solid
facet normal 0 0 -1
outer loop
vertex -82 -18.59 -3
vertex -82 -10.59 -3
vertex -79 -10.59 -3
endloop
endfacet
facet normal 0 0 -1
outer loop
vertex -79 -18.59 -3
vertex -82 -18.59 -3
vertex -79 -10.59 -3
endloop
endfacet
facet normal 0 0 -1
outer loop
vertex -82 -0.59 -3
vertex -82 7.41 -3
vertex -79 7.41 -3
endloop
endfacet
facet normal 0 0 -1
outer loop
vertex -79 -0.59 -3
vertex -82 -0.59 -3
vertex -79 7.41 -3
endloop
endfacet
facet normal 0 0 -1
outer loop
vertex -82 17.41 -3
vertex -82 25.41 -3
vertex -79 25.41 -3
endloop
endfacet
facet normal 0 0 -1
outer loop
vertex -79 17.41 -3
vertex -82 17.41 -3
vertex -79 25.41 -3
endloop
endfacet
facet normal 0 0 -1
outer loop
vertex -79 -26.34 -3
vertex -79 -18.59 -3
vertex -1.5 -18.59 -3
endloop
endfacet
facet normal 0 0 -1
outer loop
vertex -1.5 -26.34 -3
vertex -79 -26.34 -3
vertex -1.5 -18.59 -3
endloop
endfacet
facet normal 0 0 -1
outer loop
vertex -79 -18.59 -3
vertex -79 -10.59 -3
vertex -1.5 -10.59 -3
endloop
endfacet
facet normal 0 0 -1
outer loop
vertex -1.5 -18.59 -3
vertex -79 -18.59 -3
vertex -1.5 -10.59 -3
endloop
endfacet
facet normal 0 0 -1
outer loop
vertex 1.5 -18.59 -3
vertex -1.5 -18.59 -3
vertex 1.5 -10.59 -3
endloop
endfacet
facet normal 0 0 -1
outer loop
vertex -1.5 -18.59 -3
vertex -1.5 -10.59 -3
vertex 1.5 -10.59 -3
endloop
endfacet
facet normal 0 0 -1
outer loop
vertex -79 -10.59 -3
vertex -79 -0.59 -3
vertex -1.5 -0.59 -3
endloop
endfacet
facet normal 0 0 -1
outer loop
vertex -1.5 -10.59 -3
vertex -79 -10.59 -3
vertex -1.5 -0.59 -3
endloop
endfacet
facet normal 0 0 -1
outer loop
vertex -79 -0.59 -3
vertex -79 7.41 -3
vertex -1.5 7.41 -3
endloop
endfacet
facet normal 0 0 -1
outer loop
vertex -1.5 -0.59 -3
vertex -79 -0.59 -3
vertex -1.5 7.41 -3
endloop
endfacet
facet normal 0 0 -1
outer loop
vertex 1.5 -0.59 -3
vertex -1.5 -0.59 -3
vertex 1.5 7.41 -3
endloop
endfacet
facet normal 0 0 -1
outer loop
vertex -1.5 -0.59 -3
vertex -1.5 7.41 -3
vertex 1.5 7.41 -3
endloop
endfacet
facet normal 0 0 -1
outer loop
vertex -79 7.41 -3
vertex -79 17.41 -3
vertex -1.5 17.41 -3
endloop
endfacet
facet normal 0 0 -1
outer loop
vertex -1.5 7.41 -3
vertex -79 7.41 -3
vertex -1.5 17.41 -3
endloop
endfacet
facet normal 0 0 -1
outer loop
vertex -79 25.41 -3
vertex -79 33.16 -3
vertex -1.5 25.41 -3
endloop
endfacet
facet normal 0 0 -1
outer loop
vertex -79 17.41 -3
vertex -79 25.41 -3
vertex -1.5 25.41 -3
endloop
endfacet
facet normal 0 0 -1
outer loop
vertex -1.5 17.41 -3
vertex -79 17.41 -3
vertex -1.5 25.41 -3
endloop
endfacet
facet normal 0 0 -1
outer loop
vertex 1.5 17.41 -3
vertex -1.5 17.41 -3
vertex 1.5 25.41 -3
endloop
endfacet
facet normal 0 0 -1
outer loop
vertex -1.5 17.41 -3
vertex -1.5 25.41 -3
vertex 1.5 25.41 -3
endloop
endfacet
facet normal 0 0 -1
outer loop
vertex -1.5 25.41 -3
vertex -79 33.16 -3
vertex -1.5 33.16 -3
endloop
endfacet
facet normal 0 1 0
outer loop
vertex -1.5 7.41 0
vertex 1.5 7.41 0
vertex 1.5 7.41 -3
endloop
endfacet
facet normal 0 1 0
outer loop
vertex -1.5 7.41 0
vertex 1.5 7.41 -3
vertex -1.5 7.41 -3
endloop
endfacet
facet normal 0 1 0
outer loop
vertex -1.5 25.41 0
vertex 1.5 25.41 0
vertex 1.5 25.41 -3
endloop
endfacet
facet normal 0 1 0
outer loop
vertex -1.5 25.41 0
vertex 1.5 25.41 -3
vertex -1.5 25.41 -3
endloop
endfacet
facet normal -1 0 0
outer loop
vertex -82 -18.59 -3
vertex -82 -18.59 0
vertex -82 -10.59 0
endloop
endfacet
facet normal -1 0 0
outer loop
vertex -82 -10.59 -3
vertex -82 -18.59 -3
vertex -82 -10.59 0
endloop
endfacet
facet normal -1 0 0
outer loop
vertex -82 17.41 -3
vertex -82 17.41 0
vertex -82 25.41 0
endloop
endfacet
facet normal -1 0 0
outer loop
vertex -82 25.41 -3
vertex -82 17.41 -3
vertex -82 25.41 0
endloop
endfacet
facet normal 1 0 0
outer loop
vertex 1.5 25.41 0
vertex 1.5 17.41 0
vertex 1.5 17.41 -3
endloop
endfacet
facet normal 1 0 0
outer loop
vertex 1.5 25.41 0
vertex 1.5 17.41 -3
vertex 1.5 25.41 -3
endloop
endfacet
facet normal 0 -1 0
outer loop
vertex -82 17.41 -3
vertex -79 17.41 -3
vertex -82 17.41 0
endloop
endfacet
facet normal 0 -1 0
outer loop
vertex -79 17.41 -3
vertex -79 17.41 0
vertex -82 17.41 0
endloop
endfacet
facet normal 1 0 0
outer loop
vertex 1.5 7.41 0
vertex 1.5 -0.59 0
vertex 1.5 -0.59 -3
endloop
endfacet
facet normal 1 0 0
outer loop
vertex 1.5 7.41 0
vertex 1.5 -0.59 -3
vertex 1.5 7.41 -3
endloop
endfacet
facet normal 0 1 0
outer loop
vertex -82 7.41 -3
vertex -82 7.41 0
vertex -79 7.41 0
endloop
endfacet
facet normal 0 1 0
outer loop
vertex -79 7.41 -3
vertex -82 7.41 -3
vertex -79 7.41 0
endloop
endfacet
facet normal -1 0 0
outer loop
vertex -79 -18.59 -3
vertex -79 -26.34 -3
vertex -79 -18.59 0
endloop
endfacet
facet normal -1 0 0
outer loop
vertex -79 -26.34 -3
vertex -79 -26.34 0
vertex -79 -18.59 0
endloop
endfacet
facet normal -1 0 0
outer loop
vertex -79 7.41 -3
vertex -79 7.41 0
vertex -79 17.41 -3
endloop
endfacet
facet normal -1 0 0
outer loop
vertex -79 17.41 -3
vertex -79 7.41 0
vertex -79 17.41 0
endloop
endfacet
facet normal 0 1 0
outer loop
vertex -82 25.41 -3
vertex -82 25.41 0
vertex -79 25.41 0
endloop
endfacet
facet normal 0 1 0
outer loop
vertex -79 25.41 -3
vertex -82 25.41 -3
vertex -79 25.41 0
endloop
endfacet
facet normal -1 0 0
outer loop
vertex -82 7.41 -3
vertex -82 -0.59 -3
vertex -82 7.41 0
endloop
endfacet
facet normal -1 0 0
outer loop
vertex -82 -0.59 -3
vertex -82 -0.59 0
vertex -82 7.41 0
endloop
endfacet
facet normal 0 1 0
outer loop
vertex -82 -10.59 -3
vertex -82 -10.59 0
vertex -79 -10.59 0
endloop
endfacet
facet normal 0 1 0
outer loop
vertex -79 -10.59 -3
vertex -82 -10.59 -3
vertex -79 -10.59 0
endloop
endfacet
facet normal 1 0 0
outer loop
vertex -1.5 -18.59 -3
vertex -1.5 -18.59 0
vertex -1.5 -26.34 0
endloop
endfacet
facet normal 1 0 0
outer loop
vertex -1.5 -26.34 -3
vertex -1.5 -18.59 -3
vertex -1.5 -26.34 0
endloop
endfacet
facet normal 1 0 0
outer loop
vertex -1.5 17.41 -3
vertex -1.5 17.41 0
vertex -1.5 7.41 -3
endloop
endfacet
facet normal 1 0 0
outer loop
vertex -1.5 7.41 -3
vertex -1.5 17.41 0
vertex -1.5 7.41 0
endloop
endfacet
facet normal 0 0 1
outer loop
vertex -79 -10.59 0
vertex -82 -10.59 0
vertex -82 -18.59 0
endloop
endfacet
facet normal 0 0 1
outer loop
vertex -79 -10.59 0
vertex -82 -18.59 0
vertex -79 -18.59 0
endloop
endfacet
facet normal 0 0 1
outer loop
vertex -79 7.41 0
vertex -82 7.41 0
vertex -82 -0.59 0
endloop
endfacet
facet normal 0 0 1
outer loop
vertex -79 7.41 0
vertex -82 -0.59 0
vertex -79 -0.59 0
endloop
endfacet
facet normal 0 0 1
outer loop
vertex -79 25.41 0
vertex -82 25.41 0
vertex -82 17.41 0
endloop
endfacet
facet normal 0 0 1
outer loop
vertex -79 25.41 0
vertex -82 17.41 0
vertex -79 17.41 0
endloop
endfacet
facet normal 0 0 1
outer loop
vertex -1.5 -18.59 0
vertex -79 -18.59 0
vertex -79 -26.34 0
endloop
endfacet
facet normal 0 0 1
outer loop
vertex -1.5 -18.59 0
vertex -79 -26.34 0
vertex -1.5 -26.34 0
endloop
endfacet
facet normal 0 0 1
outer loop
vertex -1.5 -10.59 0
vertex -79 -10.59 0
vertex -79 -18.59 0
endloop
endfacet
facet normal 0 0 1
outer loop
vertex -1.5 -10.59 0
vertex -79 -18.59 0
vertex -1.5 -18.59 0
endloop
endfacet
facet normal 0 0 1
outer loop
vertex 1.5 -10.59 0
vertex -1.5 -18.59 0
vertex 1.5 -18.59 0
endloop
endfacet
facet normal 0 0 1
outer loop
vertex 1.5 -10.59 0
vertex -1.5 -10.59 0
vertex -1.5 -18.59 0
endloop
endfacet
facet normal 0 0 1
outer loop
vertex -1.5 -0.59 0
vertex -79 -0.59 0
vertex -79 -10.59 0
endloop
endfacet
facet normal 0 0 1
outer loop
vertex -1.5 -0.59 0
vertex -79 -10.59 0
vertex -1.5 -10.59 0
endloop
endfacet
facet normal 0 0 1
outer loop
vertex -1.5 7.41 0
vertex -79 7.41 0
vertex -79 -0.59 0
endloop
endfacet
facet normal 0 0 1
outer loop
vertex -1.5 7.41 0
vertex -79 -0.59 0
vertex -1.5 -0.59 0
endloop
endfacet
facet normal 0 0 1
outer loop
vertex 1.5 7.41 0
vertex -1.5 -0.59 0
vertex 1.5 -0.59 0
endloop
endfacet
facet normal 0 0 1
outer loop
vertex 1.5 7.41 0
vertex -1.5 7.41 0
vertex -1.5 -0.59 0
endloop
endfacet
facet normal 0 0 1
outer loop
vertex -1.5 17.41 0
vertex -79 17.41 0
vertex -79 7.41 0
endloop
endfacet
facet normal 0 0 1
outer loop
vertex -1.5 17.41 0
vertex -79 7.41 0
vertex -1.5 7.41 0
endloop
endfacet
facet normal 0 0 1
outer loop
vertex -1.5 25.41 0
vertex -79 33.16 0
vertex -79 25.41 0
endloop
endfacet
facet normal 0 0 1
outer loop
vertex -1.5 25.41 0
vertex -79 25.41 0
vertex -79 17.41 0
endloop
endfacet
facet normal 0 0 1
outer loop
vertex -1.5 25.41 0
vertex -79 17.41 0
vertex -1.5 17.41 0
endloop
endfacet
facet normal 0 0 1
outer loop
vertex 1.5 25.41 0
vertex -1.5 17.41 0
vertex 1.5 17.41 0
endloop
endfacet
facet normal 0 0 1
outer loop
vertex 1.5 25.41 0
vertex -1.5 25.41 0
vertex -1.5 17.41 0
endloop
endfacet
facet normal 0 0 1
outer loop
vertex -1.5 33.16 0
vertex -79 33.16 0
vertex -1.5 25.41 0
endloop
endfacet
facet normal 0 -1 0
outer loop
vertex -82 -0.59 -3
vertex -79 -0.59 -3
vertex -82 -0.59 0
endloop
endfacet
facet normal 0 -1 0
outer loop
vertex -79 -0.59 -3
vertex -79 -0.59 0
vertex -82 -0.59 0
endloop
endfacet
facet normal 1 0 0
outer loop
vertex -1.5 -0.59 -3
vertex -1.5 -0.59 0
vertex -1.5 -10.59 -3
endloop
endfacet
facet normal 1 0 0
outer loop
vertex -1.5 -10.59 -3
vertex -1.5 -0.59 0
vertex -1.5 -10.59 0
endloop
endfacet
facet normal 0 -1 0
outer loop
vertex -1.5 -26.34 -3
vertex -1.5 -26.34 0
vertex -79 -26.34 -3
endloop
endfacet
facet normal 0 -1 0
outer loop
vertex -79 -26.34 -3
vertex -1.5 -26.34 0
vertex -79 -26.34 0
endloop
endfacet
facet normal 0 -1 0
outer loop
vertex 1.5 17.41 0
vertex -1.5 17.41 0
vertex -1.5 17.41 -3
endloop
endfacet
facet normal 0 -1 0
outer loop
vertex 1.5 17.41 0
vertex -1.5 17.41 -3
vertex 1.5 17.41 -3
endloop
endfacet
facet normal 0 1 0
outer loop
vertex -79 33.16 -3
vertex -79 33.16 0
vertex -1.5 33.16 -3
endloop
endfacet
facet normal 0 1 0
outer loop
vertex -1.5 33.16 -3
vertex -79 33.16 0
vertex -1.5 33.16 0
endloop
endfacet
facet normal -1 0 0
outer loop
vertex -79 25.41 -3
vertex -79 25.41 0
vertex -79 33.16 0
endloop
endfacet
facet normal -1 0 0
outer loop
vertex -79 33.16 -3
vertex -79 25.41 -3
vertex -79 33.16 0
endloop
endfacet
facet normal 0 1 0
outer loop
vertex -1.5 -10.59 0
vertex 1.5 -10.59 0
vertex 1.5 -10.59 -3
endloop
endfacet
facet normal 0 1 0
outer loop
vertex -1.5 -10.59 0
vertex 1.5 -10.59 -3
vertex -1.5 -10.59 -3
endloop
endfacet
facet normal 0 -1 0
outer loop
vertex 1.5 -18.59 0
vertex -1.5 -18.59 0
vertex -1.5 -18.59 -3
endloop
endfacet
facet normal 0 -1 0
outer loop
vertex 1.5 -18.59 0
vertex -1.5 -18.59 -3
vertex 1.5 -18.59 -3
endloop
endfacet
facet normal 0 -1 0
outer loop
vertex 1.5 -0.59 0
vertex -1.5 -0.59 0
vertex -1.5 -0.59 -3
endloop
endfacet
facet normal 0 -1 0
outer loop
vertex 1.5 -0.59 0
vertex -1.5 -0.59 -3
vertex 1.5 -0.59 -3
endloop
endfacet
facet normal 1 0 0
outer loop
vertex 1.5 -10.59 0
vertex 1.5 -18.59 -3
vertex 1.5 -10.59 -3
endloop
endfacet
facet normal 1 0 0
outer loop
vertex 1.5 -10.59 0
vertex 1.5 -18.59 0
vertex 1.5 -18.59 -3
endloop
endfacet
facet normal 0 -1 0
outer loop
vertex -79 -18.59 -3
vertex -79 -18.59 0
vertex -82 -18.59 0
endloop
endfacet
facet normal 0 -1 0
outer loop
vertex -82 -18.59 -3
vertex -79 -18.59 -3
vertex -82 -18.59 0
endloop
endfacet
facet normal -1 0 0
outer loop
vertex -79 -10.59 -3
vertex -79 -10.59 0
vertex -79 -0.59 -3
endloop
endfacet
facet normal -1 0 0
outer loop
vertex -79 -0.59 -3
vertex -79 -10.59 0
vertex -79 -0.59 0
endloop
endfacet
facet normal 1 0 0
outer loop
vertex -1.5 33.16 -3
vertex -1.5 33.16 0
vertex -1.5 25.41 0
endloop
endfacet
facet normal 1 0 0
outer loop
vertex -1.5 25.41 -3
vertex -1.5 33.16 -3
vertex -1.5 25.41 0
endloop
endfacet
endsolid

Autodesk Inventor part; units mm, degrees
ref_plane "YZ Plane" through (0, 0, 0) normal (1, 0, 0) x (0, 1, 0)
ref_plane "XZ Plane" through (0, 0, 0) normal (0, 1, 0) x (-1, 0, 0)
ref_plane "XY Plane" through (0, 0, 0) normal (0, 0, 1) x (1, 0, 0)
sketch "Sketch1" plane through (0, 0, 0) normal (0, 0, 1) x (1, 0, 0)
  line L0 (-79, -26.3395) -> (-79, 33.1605) projected
  line L1 (-1.5, -26.3395) -> (-79, -26.3395) projected
  line L2 (-1.5, -9.5895) -> (-1.5, -26.3395) projected
  line L3 (-1.5, 8.4105) -> (-1.5, -1.5895) projected
  line L4 (-1.5, 33.1605) -> (-1.5, 16.4105) projected
  line L5 (-79, 33.1605) -> (-1.5, 33.1605) projected
  line L6 (-1.5, -9.5895) -> (-1.5, -1.5895)
  line L7 (-1.5, 8.4105) -> (-1.5, 16.7071)
  line L8 (-74, -21.3395) -> (-60.5, -21.3395) construction
  line L9 (-74, -7.8395) -> (-74, -21.3395) construction
  line L10 (-60.5, -7.8395) -> (-74, -7.8395) construction
  line L11 (-60.5, -21.3395) -> (-60.5, -7.8395) construction
  line L12 (-74, -3.3395) -> (-60.5, -3.3395) construction
  line L13 (-74, 10.1605) -> (-74, -3.3395) construction
  line L14 (-60.5, 10.1605) -> (-74, 10.1605) construction
  line L15 (-60.5, 10.1605) -> (-74, 10.1605) construction
  line L16 (-60.5, -3.3395) -> (-60.5, 10.1605) construction
  line L17 (-74, 14.6605) -> (-60.5, 14.6605) construction
  line L18 (-74, 28.1605) -> (-74, 14.6605) construction
  line L19 (-60.5, 28.1605) -> (-74, 28.1605) construction
  line L20 (-60.5, 14.6605) -> (-60.5, 28.1605) construction
  line L21 (-79, -18.5895) -> (-82, -18.5895)
  line L22 (-82, -18.5895) -> (-82, -10.5895)
  line L23 (-82, -10.5895) -> (-79, -10.5895)
  line L24 (-79, -0.5895) -> (-82, -0.5895)
  line L25 (-82, -0.5895) -> (-82, 7.4105)
  line L26 (-82, 7.4105) -> (-79, 7.4105)
  line L27 (-79, 17.4105) -> (-82, 17.4105)
  line L28 (-82, 17.4105) -> (-82, 25.4105)
  line L29 (-82, 25.4105) -> (-79, 25.4105)
  line L30 (-82, -9.5895) -> (-82, -1.5895) construction
  line L31 (1.5, -1.5895) -> (1.5, -9.5895) construction
  line L32 (-10.3701, -14.5895) -> (-89.08, -14.5895) construction
  line L33 (-89.5983, 3.4105) -> (-12.2572, 3.4105) construction
  line L34 (-89.5983, 21.4105) -> (-12.2572, 21.4105) construction
  line L35 (-1.5, -18.5895) -> (1.5, -18.5895)
  line L36 (1.5, -18.5895) -> (1.5, -10.5895)
  line L37 (1.5, -10.5895) -> (-1.5, -10.5895)
  line L38 (-1.5, -0.5895) -> (1.5, -0.5895)
  line L39 (1.5, -0.5895) -> (1.5, 7.4105)
  line L40 (1.5, 7.4105) -> (-1.5, 7.4105)
  line L41 (-1.5, 17.4105) -> (1.5, 17.4105)
  line L42 (1.5, 17.4105) -> (1.5, 25.4105)
  line L43 (1.5, 25.4105) -> (-1.5, 25.4105)
  point P0 (0, 0)
  point P1 (-74, -14.5895)
  point P2 (-74, 3.4105)
  point P3 (-74, 21.4105)
  point P4 (-82, -14.5895)
  point P5 (-82, 3.4105)
  point P6 (-82, 21.4105)
  point P7 (1.5, -14.5895)
  point P8 (1.5, 3.4105)
  point P9 (1.5, 21.4105)
extrude "Extrusion1" add sketch "Sketch1" against normal blind 3
properties part number "Bottom" material "Polycarbonate, Clear"
